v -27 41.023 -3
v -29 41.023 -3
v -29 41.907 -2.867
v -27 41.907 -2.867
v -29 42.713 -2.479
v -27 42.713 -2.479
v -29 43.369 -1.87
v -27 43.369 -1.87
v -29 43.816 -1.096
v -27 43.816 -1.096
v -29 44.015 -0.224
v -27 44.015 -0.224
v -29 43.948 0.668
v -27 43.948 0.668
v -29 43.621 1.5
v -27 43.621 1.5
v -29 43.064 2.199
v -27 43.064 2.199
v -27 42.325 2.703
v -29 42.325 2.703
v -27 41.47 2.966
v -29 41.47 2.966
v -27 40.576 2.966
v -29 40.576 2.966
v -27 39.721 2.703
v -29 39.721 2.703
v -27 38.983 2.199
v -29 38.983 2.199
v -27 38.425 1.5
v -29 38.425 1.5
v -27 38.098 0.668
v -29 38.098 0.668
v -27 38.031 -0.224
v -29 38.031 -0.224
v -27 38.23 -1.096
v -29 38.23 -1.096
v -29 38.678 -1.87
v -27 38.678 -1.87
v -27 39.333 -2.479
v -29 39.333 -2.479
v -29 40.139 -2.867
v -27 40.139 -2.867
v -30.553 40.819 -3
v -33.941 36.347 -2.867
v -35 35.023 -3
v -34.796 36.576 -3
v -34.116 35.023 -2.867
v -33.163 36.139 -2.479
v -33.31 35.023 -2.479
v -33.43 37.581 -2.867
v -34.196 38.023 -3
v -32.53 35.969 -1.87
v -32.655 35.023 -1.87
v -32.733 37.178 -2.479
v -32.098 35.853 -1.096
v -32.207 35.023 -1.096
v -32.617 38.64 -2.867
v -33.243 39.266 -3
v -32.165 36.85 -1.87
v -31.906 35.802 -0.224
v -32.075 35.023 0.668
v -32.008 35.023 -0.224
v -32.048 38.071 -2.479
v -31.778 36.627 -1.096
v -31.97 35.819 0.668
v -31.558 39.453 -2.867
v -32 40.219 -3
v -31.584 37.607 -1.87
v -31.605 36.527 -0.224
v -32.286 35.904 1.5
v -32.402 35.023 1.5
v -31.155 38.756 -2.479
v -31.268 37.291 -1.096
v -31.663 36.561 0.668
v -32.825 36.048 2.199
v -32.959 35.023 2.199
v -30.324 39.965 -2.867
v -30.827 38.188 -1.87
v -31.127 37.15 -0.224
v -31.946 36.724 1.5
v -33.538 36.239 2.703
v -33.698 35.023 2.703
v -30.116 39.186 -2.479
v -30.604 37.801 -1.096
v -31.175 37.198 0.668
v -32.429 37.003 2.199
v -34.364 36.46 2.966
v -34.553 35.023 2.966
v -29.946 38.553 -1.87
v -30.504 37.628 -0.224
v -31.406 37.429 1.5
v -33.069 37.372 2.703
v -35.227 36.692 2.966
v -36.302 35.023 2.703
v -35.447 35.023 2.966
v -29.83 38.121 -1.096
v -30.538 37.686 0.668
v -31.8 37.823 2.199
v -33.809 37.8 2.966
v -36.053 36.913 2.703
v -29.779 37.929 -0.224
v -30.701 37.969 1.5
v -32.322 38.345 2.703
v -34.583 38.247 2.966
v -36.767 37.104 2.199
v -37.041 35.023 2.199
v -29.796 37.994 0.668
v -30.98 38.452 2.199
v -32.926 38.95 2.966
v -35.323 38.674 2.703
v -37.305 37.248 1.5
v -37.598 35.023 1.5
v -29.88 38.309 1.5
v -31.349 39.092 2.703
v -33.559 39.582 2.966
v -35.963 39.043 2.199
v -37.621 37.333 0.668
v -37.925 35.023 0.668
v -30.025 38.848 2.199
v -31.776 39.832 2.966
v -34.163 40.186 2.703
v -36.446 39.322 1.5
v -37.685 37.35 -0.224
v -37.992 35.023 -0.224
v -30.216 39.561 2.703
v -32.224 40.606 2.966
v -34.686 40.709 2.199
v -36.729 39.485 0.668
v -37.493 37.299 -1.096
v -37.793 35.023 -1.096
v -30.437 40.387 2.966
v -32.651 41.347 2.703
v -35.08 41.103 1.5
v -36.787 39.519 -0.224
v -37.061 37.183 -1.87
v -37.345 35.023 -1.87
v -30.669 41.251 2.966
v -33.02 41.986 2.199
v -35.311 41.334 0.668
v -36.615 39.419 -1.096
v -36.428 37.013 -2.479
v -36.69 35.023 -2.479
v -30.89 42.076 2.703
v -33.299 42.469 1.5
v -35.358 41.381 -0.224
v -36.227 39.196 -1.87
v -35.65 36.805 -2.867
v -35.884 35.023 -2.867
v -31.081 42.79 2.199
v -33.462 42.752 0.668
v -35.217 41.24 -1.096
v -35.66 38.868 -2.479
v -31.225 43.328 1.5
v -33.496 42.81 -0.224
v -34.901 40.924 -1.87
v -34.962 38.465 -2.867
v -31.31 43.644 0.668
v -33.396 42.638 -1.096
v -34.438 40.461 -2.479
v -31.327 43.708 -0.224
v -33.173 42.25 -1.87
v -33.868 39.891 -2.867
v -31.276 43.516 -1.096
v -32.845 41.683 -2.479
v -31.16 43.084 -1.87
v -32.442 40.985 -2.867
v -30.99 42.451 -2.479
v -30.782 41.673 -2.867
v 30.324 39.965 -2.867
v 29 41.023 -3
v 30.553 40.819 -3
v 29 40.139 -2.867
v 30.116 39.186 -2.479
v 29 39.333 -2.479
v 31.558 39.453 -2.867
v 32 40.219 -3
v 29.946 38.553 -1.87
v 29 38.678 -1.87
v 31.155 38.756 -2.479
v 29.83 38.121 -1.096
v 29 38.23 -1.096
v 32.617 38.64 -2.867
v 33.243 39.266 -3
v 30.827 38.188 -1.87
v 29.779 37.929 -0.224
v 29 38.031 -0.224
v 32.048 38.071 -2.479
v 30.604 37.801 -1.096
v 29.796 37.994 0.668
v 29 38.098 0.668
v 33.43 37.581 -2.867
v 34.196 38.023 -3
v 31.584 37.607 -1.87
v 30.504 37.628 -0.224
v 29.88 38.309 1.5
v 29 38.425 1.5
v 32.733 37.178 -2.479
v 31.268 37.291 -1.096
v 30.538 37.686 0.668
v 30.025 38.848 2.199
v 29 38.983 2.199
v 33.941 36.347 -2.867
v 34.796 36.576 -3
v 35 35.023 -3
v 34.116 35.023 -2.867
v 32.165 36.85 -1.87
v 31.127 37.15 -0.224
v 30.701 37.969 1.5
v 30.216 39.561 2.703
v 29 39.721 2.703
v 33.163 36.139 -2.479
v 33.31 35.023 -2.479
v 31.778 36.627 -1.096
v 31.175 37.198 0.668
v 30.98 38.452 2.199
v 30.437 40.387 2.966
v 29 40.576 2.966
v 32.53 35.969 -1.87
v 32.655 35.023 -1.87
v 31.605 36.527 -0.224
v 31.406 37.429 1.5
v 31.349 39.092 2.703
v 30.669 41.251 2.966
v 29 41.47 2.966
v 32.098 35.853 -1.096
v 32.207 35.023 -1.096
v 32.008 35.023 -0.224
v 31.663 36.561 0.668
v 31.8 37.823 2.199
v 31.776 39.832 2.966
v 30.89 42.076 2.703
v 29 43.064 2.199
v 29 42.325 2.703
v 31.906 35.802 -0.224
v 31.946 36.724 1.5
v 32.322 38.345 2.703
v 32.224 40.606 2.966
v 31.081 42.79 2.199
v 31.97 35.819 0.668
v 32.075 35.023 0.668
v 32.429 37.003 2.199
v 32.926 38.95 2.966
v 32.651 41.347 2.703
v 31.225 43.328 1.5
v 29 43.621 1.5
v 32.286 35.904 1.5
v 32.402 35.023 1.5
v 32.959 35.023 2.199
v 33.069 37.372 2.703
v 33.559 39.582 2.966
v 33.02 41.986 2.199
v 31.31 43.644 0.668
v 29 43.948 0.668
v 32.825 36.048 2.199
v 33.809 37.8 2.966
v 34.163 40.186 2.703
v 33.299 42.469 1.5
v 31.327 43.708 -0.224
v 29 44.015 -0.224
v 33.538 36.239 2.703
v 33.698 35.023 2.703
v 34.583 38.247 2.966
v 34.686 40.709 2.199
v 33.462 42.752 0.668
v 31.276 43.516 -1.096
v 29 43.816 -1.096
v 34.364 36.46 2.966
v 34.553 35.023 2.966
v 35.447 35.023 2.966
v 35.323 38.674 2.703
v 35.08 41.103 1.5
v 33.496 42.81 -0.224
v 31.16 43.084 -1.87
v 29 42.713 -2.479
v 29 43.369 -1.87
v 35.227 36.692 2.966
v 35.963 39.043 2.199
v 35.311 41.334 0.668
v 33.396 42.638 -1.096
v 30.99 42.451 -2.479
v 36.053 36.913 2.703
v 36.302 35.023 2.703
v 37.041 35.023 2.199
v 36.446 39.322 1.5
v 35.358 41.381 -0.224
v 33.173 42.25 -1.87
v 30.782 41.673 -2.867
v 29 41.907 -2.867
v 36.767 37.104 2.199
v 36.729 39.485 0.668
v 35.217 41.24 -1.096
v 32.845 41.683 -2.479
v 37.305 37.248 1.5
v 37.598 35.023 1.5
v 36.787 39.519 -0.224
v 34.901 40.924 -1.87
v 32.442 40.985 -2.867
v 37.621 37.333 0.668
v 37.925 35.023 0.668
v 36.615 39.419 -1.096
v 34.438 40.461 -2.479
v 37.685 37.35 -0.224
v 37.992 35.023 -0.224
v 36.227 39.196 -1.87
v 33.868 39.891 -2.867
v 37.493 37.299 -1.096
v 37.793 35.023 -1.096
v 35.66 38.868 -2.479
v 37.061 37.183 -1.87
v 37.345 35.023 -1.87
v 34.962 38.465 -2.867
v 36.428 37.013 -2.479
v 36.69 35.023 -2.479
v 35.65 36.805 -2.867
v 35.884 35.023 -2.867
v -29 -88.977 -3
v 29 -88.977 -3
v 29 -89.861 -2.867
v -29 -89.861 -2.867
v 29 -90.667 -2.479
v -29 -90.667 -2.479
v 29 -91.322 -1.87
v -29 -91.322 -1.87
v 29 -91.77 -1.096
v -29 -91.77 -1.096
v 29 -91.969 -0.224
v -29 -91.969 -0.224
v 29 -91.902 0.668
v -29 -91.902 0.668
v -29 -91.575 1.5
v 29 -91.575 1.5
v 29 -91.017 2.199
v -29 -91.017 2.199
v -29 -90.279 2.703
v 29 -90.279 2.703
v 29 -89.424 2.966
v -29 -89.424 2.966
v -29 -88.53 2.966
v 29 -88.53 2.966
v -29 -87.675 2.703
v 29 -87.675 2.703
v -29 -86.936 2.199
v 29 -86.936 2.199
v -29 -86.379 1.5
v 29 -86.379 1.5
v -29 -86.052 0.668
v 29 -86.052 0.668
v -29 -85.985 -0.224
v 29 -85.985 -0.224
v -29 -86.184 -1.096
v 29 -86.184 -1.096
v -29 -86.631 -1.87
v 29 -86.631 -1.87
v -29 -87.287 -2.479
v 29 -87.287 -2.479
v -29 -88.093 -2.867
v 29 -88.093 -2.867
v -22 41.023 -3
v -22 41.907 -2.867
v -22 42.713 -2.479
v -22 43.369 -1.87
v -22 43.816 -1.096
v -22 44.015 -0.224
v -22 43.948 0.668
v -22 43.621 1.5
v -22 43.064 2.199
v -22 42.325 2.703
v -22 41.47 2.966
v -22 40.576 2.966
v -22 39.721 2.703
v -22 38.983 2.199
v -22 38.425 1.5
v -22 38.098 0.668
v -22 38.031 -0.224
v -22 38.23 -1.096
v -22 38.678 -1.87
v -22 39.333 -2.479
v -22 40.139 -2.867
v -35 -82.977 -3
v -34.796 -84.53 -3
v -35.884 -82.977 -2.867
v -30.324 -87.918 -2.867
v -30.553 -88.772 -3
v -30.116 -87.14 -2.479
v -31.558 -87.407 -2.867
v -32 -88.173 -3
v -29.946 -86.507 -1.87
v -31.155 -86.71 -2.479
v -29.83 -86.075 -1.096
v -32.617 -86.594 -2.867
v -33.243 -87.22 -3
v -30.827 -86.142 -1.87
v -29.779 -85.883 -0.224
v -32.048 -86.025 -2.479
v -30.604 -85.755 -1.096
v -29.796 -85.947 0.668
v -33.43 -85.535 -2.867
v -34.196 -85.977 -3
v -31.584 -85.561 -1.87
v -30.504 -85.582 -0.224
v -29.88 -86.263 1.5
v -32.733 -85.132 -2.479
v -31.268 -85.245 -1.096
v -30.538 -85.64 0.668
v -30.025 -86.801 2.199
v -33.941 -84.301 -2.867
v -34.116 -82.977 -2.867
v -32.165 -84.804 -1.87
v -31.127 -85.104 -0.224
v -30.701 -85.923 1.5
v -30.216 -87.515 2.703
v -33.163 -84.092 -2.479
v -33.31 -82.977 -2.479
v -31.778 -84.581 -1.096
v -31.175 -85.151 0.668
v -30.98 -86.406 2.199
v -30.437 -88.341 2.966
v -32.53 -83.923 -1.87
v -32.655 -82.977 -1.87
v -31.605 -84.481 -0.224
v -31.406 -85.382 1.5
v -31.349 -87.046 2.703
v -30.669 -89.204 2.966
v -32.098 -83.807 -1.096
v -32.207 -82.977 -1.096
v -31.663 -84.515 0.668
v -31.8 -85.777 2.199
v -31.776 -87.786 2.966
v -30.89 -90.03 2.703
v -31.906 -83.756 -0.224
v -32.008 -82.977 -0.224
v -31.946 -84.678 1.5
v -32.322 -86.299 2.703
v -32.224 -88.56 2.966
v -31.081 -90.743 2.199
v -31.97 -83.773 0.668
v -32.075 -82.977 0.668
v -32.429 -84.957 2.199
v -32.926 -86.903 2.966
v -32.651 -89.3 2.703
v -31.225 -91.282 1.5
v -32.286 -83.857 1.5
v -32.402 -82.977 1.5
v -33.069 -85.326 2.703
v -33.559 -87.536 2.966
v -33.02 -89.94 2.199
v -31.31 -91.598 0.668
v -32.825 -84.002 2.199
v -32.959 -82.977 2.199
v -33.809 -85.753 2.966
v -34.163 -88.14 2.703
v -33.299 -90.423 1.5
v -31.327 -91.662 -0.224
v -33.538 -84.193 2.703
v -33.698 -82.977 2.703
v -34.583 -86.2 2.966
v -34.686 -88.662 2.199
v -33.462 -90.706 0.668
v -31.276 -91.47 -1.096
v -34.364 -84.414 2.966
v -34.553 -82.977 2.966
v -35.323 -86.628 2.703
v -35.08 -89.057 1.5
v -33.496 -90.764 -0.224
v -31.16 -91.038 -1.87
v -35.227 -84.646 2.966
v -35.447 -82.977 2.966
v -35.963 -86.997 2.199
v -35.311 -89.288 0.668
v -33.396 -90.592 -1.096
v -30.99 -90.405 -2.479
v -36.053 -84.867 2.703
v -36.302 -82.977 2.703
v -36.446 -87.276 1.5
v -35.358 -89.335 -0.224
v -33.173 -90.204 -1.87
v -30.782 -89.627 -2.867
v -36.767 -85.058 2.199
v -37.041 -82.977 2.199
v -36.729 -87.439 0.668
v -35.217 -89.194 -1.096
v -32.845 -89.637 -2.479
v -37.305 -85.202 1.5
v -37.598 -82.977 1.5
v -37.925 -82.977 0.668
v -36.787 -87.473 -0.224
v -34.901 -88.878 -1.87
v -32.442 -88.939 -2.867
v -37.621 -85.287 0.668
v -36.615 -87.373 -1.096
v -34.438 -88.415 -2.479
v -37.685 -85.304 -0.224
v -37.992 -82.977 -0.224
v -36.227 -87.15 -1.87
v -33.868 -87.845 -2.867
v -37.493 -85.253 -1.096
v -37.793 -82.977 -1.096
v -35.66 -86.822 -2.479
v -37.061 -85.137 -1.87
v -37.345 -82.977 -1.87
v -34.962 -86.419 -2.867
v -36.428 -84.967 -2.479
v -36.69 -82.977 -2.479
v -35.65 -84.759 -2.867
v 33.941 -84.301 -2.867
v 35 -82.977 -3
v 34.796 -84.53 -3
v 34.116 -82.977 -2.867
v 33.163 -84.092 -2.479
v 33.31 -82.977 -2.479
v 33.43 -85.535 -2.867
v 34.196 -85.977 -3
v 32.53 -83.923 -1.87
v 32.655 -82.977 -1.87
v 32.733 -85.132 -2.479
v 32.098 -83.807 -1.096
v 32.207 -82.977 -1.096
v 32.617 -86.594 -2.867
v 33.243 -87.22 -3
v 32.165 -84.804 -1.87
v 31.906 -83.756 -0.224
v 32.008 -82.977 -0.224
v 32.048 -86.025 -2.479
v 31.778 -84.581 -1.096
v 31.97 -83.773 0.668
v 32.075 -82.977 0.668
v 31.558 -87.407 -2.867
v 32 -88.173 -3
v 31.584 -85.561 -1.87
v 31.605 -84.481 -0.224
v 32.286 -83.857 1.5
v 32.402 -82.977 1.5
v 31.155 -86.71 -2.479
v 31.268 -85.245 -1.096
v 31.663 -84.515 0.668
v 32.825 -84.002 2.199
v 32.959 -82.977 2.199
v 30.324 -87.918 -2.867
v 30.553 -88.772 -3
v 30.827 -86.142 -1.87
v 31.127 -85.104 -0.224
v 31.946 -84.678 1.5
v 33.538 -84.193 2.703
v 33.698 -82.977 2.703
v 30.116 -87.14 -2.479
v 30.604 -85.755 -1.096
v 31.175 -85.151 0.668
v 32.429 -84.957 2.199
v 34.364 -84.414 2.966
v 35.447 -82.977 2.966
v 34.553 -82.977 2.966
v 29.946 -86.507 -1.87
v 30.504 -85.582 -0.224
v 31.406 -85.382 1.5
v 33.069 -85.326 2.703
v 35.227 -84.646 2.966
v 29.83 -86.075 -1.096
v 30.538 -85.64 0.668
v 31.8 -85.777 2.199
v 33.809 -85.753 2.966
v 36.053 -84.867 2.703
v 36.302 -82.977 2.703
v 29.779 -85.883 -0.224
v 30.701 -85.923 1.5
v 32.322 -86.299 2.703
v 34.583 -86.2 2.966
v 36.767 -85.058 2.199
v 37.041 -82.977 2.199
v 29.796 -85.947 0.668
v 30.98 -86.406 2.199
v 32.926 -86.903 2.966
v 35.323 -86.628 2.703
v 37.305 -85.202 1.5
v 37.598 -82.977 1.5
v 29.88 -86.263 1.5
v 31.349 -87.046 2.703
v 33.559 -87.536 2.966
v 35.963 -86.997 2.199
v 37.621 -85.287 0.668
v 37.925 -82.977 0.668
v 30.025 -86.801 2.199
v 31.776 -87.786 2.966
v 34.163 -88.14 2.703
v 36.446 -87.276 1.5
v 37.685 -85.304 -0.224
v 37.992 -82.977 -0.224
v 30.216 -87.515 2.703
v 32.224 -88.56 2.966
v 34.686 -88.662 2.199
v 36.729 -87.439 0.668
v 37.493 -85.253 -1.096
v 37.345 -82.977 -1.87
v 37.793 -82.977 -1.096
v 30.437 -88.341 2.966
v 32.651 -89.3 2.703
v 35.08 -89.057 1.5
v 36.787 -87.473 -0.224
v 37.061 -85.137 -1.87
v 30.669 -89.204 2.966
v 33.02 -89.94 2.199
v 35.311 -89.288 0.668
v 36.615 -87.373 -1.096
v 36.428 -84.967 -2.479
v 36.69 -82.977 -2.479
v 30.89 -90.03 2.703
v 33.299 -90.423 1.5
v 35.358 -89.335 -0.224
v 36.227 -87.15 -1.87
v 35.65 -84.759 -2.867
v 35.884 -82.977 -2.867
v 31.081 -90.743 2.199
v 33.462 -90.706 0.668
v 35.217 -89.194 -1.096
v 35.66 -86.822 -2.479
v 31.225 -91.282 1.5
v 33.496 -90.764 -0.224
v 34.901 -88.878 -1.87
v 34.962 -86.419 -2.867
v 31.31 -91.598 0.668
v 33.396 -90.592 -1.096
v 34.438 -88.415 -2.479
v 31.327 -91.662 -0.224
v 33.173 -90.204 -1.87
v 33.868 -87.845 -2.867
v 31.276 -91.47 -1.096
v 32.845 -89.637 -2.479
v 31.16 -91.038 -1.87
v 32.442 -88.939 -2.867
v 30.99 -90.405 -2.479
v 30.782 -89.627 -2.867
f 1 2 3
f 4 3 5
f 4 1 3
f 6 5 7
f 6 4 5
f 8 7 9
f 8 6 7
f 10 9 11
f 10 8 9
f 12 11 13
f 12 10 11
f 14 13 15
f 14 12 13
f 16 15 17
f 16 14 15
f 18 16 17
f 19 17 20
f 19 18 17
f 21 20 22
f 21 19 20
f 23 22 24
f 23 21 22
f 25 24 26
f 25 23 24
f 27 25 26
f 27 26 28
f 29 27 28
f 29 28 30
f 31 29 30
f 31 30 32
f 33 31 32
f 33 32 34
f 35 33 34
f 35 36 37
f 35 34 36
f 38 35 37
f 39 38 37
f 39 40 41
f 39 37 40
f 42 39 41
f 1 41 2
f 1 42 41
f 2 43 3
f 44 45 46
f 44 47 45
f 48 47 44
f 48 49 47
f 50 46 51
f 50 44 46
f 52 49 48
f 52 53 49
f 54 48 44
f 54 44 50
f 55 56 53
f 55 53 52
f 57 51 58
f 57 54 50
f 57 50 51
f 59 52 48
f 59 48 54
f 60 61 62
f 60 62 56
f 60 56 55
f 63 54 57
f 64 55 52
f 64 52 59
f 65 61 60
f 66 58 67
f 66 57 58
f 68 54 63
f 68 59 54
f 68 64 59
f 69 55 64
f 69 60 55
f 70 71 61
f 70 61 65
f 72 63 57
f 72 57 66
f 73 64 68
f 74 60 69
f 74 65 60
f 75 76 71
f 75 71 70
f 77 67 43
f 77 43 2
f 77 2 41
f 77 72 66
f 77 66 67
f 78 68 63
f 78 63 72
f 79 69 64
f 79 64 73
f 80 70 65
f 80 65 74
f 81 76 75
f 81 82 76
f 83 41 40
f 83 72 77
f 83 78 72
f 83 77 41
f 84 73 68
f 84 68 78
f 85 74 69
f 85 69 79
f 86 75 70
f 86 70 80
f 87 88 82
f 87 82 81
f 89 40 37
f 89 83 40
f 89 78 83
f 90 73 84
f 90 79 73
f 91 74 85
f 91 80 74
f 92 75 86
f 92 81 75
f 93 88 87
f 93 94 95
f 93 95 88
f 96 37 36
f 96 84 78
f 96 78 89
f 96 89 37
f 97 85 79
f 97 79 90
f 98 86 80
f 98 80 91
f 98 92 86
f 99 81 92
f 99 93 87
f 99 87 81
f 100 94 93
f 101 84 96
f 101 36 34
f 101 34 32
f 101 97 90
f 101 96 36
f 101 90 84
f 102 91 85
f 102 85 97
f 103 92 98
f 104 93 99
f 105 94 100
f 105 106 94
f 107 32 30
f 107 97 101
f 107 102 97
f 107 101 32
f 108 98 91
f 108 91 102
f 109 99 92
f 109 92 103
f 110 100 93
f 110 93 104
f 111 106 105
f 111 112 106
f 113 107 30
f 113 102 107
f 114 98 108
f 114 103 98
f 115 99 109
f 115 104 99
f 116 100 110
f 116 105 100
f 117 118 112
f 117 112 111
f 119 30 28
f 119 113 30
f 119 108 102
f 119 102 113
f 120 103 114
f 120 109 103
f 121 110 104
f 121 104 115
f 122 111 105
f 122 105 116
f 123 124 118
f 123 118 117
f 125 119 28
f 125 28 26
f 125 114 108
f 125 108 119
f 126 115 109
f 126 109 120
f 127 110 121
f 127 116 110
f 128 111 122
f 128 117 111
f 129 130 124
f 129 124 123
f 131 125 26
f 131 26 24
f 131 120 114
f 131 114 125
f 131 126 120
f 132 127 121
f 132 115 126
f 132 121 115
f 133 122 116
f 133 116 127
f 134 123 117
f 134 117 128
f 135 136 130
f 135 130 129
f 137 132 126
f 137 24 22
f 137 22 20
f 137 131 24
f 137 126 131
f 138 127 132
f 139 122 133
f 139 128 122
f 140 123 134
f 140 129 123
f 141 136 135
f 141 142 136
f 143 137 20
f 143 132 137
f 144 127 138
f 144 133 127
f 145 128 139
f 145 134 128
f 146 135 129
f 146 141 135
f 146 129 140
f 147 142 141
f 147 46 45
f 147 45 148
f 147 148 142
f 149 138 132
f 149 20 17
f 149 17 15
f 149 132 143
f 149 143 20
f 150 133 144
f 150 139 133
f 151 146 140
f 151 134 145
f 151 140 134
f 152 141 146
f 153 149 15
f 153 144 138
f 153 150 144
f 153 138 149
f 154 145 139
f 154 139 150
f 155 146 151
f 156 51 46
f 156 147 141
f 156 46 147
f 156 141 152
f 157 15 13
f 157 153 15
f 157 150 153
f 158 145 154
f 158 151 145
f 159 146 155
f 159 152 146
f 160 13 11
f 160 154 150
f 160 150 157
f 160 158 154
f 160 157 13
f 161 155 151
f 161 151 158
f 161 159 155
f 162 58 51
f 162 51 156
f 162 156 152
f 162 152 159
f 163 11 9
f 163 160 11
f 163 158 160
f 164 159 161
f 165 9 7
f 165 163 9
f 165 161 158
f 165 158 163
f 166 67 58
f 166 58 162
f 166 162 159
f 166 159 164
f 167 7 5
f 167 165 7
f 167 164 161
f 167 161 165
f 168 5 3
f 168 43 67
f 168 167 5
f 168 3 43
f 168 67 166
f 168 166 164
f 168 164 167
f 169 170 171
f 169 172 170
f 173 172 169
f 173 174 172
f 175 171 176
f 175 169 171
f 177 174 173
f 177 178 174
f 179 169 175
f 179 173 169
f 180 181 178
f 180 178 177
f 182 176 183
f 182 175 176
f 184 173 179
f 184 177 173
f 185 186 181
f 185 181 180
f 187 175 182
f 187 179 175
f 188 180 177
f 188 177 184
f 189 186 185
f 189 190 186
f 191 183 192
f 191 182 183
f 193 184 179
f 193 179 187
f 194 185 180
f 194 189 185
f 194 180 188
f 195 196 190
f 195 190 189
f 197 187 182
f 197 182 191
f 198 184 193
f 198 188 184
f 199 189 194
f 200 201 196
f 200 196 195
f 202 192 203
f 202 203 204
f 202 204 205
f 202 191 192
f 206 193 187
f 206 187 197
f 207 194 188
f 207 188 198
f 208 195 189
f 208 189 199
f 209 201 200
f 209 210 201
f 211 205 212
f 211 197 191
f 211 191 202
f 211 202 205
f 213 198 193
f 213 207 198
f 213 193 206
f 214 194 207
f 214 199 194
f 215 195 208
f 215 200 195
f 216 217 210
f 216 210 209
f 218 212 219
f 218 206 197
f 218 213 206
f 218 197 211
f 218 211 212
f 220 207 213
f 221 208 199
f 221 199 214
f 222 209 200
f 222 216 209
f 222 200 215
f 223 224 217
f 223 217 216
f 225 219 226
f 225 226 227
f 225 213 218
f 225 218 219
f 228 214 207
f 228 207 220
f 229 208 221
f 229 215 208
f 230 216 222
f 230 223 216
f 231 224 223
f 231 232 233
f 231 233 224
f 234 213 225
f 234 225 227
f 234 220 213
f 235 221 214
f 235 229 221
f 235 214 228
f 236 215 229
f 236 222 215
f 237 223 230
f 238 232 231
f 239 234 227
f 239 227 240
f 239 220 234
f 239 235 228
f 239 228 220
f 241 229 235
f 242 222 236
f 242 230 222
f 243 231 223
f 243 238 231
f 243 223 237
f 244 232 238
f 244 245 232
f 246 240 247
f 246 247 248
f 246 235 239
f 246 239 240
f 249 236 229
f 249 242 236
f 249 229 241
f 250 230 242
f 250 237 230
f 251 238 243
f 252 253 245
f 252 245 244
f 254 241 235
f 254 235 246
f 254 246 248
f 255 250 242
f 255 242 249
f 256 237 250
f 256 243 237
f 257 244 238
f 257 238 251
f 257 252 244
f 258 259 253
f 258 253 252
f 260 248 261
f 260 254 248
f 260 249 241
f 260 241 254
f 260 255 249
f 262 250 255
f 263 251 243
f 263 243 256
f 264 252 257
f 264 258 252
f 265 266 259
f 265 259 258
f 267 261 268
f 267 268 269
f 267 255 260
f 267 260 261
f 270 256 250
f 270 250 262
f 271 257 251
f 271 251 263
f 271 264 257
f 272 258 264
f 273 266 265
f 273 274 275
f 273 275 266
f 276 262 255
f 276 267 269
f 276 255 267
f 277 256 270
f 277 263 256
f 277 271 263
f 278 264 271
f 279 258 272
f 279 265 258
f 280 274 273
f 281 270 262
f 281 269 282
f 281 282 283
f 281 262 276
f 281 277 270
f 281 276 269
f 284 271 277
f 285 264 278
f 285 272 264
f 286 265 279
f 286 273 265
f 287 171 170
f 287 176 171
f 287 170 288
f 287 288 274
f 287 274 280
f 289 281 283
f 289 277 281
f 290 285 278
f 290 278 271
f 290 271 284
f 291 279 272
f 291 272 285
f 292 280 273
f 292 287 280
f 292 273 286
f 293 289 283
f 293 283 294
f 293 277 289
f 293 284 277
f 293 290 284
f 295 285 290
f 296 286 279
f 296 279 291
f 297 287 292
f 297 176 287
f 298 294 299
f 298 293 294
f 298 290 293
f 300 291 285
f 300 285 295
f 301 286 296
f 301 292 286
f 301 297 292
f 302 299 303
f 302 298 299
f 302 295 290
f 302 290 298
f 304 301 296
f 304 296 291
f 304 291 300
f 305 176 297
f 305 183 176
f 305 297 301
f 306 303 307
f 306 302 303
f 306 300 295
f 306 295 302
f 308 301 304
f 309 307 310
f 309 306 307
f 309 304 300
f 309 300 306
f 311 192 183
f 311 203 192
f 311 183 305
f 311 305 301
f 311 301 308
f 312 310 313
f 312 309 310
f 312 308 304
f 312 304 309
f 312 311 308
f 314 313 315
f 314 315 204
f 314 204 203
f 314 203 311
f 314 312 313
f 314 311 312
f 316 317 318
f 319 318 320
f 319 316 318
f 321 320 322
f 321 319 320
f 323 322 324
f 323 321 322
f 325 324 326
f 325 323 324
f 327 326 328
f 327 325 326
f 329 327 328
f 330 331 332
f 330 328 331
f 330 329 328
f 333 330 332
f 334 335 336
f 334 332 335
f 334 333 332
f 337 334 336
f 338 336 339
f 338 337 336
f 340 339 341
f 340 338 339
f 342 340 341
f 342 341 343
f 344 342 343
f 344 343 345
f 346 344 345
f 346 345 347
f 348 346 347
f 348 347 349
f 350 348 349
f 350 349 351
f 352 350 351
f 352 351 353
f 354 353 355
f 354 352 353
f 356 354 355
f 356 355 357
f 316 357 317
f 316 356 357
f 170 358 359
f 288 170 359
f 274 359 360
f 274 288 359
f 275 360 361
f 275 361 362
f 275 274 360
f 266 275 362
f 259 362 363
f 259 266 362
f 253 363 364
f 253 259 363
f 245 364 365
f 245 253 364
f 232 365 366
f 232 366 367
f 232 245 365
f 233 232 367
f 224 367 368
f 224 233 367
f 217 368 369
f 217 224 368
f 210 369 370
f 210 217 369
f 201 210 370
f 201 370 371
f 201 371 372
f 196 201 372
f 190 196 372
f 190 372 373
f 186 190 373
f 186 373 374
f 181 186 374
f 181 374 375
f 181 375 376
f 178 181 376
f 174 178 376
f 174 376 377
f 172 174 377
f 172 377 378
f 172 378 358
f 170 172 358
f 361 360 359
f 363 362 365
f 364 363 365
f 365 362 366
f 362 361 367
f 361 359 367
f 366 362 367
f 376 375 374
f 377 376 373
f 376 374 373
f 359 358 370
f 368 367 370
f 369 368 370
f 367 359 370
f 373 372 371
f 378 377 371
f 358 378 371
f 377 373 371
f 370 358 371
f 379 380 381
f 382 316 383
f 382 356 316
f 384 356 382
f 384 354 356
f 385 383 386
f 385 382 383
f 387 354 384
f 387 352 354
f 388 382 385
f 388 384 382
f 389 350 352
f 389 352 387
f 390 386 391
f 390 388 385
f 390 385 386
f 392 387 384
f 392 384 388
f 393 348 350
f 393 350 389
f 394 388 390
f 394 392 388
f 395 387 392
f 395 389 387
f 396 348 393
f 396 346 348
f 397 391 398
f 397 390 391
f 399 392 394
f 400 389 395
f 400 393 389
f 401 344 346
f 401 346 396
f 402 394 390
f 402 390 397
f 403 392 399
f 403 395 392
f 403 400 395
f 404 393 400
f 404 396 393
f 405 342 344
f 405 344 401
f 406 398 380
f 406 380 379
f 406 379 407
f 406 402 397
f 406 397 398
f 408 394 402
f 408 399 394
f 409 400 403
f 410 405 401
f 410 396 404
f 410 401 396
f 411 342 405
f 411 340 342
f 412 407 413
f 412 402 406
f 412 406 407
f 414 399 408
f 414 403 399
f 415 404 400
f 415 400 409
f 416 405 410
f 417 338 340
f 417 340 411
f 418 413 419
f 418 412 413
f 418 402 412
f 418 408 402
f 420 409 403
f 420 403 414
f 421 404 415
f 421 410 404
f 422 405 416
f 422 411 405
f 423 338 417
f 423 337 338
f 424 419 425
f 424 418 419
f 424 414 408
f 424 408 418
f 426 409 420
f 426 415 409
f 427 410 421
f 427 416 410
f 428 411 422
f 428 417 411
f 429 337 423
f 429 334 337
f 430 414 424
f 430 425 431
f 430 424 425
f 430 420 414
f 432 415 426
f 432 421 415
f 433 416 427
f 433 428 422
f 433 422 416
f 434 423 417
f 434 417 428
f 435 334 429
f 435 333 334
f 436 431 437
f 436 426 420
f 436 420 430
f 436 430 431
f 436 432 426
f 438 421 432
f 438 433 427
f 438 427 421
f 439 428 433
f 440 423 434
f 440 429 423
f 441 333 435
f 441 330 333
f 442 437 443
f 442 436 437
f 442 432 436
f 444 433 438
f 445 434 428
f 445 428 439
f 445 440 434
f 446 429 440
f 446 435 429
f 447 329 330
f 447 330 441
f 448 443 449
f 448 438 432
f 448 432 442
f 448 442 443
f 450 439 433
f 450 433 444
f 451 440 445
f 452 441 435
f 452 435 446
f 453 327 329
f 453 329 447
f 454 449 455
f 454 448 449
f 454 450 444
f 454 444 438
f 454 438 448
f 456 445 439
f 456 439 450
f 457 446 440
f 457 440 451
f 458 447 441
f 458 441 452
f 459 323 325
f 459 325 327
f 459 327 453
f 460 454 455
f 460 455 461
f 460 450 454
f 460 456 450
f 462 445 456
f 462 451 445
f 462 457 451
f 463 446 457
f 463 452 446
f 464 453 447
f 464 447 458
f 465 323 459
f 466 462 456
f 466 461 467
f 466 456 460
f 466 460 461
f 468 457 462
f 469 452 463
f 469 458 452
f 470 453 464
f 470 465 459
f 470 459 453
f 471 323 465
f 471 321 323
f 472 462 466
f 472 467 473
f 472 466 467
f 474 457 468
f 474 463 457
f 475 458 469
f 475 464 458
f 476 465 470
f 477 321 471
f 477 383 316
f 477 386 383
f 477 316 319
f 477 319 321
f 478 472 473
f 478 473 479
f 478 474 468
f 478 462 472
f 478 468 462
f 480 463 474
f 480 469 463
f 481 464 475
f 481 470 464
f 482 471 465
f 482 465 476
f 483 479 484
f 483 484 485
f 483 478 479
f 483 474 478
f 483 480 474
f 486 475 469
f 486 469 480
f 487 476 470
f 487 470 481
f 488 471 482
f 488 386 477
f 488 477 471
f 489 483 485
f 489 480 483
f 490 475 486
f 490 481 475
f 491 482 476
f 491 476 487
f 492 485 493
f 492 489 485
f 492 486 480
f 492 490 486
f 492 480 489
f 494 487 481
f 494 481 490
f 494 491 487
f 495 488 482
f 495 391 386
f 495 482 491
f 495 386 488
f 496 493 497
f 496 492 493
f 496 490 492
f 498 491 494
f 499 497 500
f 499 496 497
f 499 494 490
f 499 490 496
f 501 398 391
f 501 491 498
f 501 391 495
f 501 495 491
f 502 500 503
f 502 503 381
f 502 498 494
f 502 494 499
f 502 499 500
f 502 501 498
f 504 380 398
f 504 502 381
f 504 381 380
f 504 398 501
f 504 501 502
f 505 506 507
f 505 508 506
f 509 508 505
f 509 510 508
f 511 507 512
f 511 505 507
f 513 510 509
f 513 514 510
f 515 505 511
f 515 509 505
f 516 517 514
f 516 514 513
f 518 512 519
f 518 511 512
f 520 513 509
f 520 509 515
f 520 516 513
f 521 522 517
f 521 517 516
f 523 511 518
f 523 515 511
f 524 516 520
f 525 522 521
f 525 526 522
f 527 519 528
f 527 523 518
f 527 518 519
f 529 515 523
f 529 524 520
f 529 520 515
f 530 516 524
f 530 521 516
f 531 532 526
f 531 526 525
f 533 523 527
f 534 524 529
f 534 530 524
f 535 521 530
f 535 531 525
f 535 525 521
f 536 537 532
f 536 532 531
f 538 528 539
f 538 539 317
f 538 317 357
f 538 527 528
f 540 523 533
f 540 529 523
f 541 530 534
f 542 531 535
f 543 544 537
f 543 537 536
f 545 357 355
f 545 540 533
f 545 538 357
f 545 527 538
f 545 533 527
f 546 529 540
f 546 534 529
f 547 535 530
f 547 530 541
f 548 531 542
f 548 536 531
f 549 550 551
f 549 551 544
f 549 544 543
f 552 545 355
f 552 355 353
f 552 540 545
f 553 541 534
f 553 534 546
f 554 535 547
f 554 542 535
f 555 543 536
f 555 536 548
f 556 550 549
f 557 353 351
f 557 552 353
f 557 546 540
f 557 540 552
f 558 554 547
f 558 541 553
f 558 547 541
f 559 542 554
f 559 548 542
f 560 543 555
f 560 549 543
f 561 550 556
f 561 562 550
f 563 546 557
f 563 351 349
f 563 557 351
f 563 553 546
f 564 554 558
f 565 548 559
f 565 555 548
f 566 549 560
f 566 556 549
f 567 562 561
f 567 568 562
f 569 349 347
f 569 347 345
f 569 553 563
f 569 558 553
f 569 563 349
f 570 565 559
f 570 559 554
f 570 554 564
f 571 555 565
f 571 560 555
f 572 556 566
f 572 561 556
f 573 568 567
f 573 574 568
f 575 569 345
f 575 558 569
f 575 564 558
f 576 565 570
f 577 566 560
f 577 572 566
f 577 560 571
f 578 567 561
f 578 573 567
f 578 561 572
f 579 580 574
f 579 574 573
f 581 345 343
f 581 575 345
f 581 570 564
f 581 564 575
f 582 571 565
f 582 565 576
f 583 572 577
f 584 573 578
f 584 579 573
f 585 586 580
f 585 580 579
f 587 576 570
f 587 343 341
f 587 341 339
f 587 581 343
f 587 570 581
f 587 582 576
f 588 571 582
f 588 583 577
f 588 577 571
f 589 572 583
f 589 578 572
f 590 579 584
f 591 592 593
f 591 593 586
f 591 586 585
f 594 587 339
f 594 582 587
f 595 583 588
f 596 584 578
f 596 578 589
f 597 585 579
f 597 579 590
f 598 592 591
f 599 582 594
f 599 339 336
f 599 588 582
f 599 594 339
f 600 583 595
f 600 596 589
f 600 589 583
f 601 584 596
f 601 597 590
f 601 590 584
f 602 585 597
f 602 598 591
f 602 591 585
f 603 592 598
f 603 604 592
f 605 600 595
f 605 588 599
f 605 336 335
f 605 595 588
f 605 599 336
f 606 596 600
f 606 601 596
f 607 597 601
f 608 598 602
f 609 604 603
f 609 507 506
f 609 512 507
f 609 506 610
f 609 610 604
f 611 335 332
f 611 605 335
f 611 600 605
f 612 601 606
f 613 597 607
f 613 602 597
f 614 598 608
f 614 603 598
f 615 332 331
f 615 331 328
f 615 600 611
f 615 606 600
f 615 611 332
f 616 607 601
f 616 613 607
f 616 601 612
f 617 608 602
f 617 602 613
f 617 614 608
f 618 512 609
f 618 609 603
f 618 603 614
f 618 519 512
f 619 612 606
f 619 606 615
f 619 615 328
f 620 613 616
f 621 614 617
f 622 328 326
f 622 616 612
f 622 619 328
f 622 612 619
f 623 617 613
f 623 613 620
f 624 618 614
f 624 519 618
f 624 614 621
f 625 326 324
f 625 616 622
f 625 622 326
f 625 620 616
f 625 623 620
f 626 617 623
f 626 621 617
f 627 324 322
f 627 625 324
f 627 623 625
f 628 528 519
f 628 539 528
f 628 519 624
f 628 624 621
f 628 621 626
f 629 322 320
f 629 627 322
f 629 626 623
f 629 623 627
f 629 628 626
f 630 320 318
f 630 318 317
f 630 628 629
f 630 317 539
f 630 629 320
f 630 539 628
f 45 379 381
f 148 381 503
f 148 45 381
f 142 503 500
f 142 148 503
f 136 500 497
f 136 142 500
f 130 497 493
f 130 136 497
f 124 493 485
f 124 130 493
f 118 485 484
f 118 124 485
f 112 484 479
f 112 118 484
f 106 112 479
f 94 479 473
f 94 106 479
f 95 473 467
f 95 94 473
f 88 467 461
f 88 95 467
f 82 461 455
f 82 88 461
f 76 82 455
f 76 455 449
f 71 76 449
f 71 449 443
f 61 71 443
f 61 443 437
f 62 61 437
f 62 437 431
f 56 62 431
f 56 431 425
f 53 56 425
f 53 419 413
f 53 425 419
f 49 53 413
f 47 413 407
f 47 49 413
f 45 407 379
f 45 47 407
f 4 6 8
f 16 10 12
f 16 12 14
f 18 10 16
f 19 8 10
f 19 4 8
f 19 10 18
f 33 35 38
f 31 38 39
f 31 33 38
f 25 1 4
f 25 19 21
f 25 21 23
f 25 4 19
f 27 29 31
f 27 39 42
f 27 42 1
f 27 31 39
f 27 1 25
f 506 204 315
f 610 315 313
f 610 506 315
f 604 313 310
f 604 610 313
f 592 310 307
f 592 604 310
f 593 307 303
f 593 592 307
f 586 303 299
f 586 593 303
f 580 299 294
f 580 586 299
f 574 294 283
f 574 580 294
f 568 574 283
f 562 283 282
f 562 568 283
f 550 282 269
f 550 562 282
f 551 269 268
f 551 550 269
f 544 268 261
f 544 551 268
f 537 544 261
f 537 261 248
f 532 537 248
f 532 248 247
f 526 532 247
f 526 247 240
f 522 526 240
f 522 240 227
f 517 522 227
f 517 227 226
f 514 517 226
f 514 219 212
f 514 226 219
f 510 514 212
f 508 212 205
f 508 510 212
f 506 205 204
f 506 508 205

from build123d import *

# Parameters (mm, degrees)
ESBO_O2_R = 3


with BuildPart() as part:
    # Varredura1: sweep along a path in Esboço1
    with BuildLine(Plane.XY) as varredura1_path:
        Line((-22, 41.023088741), (29, 41.023088741))
        ThreePointArc((29, 41.023088741), (33.242640687, 39.265729428), (35, 35.023088741))
        Line((35, 35.023088741), (35, -82.976911259))
        ThreePointArc((35, -82.976911259), (33.242640687, -87.219551946), (29, -88.976911259))
        Line((29, -88.976911259), (-29, -88.976911259))
        ThreePointArc((-29, -88.976911259), (-33.242640687, -87.219551946), (-35, -82.976911259))
        Line((-35, -82.976911259), (-35, 35.023088741))
        ThreePointArc((-35, 35.023088741), (-33.242640687, 39.265729428), (-29, 41.023088741))
        Line((-29, 41.023088741), (-27, 41.023088741))
    # Esboço2 → Varredura1 (sweep)
    with BuildSketch(Plane(origin=(-22, 41.023088741, 0), x_dir=(0, 0, -1), z_dir=(1, 0, 0))):
        Circle(ESBO_O2_R)
    sweep(path=varredura1_path.line)


solid = part.part
